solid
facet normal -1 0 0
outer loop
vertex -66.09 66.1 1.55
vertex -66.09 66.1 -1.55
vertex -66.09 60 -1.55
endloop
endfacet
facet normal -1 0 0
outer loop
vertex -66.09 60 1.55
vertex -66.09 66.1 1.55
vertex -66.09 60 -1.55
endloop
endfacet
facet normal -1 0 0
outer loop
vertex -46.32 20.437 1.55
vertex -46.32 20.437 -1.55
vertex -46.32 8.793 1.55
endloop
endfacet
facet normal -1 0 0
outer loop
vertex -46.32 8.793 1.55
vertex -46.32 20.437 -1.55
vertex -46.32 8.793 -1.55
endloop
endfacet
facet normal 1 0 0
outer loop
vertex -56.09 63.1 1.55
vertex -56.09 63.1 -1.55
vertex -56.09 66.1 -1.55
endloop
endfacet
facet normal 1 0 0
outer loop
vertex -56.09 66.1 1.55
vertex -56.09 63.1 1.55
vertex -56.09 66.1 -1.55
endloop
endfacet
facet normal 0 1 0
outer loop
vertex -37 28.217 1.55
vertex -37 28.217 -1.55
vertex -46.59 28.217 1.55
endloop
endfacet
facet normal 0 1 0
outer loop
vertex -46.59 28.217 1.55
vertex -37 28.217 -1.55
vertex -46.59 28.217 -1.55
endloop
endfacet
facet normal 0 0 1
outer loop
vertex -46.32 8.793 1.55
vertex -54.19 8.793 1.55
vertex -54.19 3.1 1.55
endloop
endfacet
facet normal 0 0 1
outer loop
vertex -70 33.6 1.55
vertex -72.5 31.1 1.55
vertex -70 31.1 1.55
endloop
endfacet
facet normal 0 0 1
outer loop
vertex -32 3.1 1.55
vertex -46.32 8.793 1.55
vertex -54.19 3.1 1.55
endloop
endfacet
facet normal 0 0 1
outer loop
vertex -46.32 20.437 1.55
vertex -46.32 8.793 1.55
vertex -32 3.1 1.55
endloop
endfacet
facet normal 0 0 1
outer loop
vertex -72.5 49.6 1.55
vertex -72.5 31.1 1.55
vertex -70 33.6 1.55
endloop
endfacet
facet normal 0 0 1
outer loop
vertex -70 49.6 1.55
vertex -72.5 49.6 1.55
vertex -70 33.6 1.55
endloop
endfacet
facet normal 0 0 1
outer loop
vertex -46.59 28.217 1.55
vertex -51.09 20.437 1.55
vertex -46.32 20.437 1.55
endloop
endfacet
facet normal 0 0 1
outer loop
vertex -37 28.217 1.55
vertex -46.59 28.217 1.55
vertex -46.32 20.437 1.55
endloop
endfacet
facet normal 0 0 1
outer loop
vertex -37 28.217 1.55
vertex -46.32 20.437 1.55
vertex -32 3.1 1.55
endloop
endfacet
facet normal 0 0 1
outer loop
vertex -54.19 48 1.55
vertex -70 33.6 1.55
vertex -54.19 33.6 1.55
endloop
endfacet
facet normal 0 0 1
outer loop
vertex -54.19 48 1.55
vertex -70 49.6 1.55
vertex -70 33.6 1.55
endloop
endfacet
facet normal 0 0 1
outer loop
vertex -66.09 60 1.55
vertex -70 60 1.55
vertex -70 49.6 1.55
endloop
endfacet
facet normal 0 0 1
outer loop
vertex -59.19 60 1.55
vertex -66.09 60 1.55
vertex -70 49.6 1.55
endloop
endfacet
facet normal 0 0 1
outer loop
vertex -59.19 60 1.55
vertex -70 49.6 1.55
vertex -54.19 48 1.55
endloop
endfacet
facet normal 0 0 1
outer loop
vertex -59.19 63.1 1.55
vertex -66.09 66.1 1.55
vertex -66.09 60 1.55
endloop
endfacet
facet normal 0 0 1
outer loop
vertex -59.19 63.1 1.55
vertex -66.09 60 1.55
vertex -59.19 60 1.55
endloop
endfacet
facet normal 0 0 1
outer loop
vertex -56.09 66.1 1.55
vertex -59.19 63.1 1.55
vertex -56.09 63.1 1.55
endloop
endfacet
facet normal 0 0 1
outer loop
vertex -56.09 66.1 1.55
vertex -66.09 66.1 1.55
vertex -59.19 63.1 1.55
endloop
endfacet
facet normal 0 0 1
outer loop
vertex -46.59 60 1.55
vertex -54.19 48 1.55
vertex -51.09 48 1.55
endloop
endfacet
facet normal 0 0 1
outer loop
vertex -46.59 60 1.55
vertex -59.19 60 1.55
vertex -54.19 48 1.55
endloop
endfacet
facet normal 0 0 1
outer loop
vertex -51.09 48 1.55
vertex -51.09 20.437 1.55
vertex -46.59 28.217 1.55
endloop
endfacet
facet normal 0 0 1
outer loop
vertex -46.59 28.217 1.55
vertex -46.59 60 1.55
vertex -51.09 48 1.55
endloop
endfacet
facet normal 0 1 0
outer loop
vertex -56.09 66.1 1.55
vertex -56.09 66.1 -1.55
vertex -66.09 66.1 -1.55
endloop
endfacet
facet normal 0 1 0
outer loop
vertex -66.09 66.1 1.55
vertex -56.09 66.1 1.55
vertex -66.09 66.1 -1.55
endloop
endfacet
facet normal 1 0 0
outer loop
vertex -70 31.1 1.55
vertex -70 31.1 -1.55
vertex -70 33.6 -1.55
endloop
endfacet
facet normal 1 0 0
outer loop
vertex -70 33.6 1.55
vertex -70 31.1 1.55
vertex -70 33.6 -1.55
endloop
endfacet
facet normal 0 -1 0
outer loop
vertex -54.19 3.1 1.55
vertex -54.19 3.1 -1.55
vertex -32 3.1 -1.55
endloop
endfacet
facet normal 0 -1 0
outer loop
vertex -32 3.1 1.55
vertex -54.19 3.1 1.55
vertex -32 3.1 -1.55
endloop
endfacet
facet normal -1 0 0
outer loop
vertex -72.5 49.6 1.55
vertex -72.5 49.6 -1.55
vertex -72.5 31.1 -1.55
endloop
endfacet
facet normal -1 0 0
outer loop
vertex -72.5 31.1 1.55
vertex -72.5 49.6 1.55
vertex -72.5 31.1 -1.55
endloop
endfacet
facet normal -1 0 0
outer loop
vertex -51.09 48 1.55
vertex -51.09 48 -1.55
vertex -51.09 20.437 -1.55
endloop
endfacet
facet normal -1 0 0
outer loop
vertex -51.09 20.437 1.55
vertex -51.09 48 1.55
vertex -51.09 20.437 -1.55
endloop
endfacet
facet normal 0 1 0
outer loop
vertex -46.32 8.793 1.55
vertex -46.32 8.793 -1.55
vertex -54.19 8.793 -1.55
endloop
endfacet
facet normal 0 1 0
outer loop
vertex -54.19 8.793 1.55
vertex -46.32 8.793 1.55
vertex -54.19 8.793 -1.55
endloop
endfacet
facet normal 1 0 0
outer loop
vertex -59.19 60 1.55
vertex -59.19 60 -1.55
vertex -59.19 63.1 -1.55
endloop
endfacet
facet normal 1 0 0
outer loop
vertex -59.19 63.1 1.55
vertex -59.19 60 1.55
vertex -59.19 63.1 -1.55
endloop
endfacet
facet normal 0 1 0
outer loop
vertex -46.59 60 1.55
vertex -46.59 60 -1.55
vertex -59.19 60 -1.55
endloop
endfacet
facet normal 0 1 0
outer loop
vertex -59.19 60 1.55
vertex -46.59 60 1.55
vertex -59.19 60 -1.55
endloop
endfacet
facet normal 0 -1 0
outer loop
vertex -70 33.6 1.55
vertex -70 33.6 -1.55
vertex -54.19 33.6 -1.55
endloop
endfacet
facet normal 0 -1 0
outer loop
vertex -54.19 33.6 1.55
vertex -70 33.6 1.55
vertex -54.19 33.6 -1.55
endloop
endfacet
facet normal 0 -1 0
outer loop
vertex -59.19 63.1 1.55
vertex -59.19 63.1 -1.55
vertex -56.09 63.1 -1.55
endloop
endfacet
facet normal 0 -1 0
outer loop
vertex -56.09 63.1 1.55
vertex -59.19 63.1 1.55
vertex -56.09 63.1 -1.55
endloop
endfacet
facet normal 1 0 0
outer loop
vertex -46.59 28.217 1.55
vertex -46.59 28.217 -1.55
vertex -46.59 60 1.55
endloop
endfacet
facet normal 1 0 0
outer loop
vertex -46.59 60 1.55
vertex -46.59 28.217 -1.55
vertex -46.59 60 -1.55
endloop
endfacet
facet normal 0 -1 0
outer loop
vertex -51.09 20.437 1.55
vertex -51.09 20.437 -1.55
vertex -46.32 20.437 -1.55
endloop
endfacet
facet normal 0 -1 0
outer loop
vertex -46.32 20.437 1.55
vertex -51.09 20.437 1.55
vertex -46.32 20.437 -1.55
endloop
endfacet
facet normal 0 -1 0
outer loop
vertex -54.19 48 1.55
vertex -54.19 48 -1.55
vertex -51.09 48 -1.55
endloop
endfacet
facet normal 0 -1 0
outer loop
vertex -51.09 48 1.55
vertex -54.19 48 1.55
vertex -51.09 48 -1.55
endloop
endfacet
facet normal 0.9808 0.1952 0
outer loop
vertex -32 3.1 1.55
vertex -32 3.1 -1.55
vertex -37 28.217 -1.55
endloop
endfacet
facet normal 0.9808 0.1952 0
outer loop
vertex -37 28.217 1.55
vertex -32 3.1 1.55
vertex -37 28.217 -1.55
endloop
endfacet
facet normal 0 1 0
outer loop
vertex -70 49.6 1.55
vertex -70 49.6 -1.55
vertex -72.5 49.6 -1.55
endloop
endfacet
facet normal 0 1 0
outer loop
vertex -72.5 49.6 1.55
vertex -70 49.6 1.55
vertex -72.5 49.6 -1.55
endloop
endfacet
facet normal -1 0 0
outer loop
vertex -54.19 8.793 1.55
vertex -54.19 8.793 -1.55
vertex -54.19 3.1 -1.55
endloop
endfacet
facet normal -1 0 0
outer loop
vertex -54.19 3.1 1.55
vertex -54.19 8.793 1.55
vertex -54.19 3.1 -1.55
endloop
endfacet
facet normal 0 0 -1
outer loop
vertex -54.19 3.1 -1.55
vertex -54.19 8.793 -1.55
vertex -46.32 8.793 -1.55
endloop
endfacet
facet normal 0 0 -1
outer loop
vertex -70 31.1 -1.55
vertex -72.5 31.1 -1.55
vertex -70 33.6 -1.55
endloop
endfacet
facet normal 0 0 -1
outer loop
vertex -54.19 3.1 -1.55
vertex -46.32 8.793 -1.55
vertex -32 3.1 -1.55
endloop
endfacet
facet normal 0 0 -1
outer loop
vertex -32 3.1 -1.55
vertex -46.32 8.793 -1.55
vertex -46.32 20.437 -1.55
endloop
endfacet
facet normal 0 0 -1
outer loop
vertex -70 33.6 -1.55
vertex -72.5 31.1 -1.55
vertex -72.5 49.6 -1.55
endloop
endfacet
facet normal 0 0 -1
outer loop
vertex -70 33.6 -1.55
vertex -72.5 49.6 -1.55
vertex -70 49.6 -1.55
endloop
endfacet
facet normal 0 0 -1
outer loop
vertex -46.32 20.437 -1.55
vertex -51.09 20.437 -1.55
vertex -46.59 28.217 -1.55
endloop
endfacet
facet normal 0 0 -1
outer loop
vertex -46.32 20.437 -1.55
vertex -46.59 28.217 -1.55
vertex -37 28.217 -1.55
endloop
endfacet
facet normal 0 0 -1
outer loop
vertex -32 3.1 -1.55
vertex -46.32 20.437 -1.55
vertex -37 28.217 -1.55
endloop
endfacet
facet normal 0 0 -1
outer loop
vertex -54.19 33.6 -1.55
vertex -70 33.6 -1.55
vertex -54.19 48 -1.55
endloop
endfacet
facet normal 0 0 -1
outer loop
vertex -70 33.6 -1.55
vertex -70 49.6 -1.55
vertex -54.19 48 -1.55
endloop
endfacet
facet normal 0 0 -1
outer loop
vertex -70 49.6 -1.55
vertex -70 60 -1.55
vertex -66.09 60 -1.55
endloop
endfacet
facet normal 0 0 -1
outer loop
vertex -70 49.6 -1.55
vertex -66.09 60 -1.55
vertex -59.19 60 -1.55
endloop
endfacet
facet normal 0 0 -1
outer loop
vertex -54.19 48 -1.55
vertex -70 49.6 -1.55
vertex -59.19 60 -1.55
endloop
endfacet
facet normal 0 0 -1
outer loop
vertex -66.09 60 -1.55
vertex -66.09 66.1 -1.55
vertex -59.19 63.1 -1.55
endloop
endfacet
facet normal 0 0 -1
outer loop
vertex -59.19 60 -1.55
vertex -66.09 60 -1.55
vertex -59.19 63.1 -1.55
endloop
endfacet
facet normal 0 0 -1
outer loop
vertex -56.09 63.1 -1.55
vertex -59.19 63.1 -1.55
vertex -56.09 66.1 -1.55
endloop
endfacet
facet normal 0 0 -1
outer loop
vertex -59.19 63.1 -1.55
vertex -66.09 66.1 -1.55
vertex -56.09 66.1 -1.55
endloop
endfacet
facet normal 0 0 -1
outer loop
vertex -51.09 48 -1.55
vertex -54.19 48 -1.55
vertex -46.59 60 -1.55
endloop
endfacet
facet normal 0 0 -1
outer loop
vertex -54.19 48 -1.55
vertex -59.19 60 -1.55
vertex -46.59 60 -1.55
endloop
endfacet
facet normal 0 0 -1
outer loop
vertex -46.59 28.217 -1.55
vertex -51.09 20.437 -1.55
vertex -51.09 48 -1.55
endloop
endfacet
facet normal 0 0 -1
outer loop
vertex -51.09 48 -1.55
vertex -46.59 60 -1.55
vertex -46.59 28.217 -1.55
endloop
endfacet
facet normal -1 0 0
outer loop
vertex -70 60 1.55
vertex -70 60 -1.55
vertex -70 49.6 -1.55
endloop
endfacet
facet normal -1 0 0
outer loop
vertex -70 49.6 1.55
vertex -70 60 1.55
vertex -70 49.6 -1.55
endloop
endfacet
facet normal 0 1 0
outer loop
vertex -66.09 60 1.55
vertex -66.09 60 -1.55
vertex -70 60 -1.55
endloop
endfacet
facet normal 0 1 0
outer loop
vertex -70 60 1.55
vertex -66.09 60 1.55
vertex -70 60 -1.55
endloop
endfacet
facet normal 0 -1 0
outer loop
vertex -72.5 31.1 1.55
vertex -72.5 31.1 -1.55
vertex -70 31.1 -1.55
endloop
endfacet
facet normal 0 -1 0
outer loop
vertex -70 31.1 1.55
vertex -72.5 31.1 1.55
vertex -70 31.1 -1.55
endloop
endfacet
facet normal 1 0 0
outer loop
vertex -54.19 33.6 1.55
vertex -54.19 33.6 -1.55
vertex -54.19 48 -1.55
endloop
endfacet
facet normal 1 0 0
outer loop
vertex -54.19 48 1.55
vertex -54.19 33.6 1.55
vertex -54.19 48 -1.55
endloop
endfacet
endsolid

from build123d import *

# Parameters (mm, degrees)
BOSS_EXTRUDE1_DEPTH      = 1.55
BOSS_EXTRUDE1_DEPTH_BACK = 1.55


with BuildPart() as part:
    # Sketch1 → Boss-Extrude1 (new, two sides: drawn at the far end of the back side and taken through both)
    with BuildSketch(Plane.XY.offset(-BOSS_EXTRUDE1_DEPTH_BACK)):
        Polygon((-72.5, 31.1), (-70, 31.1), (-70, 33.6), (-54.19, 33.6), (-54.19, 48), (-51.09, 48), (-51.09, 20.43683659), (-46.319540472, 20.43683659), (-46.319540472, 8.793397686), (-54.19, 8.793397686), (-54.19, 3.1), (-32, 3.1), (-37, 28.21655276), (-46.59, 28.21655276), (-46.59, 60), (-59.19, 60), (-59.19, 63.1), (-56.09, 63.1), (-56.09, 66.1), (-66.09, 66.1), (-66.09, 60), (-70, 60), (-70, 49.6), (-72.5, 49.6), align=None)
    extrude(amount=BOSS_EXTRUDE1_DEPTH + BOSS_EXTRUDE1_DEPTH_BACK)


solid = part.part
